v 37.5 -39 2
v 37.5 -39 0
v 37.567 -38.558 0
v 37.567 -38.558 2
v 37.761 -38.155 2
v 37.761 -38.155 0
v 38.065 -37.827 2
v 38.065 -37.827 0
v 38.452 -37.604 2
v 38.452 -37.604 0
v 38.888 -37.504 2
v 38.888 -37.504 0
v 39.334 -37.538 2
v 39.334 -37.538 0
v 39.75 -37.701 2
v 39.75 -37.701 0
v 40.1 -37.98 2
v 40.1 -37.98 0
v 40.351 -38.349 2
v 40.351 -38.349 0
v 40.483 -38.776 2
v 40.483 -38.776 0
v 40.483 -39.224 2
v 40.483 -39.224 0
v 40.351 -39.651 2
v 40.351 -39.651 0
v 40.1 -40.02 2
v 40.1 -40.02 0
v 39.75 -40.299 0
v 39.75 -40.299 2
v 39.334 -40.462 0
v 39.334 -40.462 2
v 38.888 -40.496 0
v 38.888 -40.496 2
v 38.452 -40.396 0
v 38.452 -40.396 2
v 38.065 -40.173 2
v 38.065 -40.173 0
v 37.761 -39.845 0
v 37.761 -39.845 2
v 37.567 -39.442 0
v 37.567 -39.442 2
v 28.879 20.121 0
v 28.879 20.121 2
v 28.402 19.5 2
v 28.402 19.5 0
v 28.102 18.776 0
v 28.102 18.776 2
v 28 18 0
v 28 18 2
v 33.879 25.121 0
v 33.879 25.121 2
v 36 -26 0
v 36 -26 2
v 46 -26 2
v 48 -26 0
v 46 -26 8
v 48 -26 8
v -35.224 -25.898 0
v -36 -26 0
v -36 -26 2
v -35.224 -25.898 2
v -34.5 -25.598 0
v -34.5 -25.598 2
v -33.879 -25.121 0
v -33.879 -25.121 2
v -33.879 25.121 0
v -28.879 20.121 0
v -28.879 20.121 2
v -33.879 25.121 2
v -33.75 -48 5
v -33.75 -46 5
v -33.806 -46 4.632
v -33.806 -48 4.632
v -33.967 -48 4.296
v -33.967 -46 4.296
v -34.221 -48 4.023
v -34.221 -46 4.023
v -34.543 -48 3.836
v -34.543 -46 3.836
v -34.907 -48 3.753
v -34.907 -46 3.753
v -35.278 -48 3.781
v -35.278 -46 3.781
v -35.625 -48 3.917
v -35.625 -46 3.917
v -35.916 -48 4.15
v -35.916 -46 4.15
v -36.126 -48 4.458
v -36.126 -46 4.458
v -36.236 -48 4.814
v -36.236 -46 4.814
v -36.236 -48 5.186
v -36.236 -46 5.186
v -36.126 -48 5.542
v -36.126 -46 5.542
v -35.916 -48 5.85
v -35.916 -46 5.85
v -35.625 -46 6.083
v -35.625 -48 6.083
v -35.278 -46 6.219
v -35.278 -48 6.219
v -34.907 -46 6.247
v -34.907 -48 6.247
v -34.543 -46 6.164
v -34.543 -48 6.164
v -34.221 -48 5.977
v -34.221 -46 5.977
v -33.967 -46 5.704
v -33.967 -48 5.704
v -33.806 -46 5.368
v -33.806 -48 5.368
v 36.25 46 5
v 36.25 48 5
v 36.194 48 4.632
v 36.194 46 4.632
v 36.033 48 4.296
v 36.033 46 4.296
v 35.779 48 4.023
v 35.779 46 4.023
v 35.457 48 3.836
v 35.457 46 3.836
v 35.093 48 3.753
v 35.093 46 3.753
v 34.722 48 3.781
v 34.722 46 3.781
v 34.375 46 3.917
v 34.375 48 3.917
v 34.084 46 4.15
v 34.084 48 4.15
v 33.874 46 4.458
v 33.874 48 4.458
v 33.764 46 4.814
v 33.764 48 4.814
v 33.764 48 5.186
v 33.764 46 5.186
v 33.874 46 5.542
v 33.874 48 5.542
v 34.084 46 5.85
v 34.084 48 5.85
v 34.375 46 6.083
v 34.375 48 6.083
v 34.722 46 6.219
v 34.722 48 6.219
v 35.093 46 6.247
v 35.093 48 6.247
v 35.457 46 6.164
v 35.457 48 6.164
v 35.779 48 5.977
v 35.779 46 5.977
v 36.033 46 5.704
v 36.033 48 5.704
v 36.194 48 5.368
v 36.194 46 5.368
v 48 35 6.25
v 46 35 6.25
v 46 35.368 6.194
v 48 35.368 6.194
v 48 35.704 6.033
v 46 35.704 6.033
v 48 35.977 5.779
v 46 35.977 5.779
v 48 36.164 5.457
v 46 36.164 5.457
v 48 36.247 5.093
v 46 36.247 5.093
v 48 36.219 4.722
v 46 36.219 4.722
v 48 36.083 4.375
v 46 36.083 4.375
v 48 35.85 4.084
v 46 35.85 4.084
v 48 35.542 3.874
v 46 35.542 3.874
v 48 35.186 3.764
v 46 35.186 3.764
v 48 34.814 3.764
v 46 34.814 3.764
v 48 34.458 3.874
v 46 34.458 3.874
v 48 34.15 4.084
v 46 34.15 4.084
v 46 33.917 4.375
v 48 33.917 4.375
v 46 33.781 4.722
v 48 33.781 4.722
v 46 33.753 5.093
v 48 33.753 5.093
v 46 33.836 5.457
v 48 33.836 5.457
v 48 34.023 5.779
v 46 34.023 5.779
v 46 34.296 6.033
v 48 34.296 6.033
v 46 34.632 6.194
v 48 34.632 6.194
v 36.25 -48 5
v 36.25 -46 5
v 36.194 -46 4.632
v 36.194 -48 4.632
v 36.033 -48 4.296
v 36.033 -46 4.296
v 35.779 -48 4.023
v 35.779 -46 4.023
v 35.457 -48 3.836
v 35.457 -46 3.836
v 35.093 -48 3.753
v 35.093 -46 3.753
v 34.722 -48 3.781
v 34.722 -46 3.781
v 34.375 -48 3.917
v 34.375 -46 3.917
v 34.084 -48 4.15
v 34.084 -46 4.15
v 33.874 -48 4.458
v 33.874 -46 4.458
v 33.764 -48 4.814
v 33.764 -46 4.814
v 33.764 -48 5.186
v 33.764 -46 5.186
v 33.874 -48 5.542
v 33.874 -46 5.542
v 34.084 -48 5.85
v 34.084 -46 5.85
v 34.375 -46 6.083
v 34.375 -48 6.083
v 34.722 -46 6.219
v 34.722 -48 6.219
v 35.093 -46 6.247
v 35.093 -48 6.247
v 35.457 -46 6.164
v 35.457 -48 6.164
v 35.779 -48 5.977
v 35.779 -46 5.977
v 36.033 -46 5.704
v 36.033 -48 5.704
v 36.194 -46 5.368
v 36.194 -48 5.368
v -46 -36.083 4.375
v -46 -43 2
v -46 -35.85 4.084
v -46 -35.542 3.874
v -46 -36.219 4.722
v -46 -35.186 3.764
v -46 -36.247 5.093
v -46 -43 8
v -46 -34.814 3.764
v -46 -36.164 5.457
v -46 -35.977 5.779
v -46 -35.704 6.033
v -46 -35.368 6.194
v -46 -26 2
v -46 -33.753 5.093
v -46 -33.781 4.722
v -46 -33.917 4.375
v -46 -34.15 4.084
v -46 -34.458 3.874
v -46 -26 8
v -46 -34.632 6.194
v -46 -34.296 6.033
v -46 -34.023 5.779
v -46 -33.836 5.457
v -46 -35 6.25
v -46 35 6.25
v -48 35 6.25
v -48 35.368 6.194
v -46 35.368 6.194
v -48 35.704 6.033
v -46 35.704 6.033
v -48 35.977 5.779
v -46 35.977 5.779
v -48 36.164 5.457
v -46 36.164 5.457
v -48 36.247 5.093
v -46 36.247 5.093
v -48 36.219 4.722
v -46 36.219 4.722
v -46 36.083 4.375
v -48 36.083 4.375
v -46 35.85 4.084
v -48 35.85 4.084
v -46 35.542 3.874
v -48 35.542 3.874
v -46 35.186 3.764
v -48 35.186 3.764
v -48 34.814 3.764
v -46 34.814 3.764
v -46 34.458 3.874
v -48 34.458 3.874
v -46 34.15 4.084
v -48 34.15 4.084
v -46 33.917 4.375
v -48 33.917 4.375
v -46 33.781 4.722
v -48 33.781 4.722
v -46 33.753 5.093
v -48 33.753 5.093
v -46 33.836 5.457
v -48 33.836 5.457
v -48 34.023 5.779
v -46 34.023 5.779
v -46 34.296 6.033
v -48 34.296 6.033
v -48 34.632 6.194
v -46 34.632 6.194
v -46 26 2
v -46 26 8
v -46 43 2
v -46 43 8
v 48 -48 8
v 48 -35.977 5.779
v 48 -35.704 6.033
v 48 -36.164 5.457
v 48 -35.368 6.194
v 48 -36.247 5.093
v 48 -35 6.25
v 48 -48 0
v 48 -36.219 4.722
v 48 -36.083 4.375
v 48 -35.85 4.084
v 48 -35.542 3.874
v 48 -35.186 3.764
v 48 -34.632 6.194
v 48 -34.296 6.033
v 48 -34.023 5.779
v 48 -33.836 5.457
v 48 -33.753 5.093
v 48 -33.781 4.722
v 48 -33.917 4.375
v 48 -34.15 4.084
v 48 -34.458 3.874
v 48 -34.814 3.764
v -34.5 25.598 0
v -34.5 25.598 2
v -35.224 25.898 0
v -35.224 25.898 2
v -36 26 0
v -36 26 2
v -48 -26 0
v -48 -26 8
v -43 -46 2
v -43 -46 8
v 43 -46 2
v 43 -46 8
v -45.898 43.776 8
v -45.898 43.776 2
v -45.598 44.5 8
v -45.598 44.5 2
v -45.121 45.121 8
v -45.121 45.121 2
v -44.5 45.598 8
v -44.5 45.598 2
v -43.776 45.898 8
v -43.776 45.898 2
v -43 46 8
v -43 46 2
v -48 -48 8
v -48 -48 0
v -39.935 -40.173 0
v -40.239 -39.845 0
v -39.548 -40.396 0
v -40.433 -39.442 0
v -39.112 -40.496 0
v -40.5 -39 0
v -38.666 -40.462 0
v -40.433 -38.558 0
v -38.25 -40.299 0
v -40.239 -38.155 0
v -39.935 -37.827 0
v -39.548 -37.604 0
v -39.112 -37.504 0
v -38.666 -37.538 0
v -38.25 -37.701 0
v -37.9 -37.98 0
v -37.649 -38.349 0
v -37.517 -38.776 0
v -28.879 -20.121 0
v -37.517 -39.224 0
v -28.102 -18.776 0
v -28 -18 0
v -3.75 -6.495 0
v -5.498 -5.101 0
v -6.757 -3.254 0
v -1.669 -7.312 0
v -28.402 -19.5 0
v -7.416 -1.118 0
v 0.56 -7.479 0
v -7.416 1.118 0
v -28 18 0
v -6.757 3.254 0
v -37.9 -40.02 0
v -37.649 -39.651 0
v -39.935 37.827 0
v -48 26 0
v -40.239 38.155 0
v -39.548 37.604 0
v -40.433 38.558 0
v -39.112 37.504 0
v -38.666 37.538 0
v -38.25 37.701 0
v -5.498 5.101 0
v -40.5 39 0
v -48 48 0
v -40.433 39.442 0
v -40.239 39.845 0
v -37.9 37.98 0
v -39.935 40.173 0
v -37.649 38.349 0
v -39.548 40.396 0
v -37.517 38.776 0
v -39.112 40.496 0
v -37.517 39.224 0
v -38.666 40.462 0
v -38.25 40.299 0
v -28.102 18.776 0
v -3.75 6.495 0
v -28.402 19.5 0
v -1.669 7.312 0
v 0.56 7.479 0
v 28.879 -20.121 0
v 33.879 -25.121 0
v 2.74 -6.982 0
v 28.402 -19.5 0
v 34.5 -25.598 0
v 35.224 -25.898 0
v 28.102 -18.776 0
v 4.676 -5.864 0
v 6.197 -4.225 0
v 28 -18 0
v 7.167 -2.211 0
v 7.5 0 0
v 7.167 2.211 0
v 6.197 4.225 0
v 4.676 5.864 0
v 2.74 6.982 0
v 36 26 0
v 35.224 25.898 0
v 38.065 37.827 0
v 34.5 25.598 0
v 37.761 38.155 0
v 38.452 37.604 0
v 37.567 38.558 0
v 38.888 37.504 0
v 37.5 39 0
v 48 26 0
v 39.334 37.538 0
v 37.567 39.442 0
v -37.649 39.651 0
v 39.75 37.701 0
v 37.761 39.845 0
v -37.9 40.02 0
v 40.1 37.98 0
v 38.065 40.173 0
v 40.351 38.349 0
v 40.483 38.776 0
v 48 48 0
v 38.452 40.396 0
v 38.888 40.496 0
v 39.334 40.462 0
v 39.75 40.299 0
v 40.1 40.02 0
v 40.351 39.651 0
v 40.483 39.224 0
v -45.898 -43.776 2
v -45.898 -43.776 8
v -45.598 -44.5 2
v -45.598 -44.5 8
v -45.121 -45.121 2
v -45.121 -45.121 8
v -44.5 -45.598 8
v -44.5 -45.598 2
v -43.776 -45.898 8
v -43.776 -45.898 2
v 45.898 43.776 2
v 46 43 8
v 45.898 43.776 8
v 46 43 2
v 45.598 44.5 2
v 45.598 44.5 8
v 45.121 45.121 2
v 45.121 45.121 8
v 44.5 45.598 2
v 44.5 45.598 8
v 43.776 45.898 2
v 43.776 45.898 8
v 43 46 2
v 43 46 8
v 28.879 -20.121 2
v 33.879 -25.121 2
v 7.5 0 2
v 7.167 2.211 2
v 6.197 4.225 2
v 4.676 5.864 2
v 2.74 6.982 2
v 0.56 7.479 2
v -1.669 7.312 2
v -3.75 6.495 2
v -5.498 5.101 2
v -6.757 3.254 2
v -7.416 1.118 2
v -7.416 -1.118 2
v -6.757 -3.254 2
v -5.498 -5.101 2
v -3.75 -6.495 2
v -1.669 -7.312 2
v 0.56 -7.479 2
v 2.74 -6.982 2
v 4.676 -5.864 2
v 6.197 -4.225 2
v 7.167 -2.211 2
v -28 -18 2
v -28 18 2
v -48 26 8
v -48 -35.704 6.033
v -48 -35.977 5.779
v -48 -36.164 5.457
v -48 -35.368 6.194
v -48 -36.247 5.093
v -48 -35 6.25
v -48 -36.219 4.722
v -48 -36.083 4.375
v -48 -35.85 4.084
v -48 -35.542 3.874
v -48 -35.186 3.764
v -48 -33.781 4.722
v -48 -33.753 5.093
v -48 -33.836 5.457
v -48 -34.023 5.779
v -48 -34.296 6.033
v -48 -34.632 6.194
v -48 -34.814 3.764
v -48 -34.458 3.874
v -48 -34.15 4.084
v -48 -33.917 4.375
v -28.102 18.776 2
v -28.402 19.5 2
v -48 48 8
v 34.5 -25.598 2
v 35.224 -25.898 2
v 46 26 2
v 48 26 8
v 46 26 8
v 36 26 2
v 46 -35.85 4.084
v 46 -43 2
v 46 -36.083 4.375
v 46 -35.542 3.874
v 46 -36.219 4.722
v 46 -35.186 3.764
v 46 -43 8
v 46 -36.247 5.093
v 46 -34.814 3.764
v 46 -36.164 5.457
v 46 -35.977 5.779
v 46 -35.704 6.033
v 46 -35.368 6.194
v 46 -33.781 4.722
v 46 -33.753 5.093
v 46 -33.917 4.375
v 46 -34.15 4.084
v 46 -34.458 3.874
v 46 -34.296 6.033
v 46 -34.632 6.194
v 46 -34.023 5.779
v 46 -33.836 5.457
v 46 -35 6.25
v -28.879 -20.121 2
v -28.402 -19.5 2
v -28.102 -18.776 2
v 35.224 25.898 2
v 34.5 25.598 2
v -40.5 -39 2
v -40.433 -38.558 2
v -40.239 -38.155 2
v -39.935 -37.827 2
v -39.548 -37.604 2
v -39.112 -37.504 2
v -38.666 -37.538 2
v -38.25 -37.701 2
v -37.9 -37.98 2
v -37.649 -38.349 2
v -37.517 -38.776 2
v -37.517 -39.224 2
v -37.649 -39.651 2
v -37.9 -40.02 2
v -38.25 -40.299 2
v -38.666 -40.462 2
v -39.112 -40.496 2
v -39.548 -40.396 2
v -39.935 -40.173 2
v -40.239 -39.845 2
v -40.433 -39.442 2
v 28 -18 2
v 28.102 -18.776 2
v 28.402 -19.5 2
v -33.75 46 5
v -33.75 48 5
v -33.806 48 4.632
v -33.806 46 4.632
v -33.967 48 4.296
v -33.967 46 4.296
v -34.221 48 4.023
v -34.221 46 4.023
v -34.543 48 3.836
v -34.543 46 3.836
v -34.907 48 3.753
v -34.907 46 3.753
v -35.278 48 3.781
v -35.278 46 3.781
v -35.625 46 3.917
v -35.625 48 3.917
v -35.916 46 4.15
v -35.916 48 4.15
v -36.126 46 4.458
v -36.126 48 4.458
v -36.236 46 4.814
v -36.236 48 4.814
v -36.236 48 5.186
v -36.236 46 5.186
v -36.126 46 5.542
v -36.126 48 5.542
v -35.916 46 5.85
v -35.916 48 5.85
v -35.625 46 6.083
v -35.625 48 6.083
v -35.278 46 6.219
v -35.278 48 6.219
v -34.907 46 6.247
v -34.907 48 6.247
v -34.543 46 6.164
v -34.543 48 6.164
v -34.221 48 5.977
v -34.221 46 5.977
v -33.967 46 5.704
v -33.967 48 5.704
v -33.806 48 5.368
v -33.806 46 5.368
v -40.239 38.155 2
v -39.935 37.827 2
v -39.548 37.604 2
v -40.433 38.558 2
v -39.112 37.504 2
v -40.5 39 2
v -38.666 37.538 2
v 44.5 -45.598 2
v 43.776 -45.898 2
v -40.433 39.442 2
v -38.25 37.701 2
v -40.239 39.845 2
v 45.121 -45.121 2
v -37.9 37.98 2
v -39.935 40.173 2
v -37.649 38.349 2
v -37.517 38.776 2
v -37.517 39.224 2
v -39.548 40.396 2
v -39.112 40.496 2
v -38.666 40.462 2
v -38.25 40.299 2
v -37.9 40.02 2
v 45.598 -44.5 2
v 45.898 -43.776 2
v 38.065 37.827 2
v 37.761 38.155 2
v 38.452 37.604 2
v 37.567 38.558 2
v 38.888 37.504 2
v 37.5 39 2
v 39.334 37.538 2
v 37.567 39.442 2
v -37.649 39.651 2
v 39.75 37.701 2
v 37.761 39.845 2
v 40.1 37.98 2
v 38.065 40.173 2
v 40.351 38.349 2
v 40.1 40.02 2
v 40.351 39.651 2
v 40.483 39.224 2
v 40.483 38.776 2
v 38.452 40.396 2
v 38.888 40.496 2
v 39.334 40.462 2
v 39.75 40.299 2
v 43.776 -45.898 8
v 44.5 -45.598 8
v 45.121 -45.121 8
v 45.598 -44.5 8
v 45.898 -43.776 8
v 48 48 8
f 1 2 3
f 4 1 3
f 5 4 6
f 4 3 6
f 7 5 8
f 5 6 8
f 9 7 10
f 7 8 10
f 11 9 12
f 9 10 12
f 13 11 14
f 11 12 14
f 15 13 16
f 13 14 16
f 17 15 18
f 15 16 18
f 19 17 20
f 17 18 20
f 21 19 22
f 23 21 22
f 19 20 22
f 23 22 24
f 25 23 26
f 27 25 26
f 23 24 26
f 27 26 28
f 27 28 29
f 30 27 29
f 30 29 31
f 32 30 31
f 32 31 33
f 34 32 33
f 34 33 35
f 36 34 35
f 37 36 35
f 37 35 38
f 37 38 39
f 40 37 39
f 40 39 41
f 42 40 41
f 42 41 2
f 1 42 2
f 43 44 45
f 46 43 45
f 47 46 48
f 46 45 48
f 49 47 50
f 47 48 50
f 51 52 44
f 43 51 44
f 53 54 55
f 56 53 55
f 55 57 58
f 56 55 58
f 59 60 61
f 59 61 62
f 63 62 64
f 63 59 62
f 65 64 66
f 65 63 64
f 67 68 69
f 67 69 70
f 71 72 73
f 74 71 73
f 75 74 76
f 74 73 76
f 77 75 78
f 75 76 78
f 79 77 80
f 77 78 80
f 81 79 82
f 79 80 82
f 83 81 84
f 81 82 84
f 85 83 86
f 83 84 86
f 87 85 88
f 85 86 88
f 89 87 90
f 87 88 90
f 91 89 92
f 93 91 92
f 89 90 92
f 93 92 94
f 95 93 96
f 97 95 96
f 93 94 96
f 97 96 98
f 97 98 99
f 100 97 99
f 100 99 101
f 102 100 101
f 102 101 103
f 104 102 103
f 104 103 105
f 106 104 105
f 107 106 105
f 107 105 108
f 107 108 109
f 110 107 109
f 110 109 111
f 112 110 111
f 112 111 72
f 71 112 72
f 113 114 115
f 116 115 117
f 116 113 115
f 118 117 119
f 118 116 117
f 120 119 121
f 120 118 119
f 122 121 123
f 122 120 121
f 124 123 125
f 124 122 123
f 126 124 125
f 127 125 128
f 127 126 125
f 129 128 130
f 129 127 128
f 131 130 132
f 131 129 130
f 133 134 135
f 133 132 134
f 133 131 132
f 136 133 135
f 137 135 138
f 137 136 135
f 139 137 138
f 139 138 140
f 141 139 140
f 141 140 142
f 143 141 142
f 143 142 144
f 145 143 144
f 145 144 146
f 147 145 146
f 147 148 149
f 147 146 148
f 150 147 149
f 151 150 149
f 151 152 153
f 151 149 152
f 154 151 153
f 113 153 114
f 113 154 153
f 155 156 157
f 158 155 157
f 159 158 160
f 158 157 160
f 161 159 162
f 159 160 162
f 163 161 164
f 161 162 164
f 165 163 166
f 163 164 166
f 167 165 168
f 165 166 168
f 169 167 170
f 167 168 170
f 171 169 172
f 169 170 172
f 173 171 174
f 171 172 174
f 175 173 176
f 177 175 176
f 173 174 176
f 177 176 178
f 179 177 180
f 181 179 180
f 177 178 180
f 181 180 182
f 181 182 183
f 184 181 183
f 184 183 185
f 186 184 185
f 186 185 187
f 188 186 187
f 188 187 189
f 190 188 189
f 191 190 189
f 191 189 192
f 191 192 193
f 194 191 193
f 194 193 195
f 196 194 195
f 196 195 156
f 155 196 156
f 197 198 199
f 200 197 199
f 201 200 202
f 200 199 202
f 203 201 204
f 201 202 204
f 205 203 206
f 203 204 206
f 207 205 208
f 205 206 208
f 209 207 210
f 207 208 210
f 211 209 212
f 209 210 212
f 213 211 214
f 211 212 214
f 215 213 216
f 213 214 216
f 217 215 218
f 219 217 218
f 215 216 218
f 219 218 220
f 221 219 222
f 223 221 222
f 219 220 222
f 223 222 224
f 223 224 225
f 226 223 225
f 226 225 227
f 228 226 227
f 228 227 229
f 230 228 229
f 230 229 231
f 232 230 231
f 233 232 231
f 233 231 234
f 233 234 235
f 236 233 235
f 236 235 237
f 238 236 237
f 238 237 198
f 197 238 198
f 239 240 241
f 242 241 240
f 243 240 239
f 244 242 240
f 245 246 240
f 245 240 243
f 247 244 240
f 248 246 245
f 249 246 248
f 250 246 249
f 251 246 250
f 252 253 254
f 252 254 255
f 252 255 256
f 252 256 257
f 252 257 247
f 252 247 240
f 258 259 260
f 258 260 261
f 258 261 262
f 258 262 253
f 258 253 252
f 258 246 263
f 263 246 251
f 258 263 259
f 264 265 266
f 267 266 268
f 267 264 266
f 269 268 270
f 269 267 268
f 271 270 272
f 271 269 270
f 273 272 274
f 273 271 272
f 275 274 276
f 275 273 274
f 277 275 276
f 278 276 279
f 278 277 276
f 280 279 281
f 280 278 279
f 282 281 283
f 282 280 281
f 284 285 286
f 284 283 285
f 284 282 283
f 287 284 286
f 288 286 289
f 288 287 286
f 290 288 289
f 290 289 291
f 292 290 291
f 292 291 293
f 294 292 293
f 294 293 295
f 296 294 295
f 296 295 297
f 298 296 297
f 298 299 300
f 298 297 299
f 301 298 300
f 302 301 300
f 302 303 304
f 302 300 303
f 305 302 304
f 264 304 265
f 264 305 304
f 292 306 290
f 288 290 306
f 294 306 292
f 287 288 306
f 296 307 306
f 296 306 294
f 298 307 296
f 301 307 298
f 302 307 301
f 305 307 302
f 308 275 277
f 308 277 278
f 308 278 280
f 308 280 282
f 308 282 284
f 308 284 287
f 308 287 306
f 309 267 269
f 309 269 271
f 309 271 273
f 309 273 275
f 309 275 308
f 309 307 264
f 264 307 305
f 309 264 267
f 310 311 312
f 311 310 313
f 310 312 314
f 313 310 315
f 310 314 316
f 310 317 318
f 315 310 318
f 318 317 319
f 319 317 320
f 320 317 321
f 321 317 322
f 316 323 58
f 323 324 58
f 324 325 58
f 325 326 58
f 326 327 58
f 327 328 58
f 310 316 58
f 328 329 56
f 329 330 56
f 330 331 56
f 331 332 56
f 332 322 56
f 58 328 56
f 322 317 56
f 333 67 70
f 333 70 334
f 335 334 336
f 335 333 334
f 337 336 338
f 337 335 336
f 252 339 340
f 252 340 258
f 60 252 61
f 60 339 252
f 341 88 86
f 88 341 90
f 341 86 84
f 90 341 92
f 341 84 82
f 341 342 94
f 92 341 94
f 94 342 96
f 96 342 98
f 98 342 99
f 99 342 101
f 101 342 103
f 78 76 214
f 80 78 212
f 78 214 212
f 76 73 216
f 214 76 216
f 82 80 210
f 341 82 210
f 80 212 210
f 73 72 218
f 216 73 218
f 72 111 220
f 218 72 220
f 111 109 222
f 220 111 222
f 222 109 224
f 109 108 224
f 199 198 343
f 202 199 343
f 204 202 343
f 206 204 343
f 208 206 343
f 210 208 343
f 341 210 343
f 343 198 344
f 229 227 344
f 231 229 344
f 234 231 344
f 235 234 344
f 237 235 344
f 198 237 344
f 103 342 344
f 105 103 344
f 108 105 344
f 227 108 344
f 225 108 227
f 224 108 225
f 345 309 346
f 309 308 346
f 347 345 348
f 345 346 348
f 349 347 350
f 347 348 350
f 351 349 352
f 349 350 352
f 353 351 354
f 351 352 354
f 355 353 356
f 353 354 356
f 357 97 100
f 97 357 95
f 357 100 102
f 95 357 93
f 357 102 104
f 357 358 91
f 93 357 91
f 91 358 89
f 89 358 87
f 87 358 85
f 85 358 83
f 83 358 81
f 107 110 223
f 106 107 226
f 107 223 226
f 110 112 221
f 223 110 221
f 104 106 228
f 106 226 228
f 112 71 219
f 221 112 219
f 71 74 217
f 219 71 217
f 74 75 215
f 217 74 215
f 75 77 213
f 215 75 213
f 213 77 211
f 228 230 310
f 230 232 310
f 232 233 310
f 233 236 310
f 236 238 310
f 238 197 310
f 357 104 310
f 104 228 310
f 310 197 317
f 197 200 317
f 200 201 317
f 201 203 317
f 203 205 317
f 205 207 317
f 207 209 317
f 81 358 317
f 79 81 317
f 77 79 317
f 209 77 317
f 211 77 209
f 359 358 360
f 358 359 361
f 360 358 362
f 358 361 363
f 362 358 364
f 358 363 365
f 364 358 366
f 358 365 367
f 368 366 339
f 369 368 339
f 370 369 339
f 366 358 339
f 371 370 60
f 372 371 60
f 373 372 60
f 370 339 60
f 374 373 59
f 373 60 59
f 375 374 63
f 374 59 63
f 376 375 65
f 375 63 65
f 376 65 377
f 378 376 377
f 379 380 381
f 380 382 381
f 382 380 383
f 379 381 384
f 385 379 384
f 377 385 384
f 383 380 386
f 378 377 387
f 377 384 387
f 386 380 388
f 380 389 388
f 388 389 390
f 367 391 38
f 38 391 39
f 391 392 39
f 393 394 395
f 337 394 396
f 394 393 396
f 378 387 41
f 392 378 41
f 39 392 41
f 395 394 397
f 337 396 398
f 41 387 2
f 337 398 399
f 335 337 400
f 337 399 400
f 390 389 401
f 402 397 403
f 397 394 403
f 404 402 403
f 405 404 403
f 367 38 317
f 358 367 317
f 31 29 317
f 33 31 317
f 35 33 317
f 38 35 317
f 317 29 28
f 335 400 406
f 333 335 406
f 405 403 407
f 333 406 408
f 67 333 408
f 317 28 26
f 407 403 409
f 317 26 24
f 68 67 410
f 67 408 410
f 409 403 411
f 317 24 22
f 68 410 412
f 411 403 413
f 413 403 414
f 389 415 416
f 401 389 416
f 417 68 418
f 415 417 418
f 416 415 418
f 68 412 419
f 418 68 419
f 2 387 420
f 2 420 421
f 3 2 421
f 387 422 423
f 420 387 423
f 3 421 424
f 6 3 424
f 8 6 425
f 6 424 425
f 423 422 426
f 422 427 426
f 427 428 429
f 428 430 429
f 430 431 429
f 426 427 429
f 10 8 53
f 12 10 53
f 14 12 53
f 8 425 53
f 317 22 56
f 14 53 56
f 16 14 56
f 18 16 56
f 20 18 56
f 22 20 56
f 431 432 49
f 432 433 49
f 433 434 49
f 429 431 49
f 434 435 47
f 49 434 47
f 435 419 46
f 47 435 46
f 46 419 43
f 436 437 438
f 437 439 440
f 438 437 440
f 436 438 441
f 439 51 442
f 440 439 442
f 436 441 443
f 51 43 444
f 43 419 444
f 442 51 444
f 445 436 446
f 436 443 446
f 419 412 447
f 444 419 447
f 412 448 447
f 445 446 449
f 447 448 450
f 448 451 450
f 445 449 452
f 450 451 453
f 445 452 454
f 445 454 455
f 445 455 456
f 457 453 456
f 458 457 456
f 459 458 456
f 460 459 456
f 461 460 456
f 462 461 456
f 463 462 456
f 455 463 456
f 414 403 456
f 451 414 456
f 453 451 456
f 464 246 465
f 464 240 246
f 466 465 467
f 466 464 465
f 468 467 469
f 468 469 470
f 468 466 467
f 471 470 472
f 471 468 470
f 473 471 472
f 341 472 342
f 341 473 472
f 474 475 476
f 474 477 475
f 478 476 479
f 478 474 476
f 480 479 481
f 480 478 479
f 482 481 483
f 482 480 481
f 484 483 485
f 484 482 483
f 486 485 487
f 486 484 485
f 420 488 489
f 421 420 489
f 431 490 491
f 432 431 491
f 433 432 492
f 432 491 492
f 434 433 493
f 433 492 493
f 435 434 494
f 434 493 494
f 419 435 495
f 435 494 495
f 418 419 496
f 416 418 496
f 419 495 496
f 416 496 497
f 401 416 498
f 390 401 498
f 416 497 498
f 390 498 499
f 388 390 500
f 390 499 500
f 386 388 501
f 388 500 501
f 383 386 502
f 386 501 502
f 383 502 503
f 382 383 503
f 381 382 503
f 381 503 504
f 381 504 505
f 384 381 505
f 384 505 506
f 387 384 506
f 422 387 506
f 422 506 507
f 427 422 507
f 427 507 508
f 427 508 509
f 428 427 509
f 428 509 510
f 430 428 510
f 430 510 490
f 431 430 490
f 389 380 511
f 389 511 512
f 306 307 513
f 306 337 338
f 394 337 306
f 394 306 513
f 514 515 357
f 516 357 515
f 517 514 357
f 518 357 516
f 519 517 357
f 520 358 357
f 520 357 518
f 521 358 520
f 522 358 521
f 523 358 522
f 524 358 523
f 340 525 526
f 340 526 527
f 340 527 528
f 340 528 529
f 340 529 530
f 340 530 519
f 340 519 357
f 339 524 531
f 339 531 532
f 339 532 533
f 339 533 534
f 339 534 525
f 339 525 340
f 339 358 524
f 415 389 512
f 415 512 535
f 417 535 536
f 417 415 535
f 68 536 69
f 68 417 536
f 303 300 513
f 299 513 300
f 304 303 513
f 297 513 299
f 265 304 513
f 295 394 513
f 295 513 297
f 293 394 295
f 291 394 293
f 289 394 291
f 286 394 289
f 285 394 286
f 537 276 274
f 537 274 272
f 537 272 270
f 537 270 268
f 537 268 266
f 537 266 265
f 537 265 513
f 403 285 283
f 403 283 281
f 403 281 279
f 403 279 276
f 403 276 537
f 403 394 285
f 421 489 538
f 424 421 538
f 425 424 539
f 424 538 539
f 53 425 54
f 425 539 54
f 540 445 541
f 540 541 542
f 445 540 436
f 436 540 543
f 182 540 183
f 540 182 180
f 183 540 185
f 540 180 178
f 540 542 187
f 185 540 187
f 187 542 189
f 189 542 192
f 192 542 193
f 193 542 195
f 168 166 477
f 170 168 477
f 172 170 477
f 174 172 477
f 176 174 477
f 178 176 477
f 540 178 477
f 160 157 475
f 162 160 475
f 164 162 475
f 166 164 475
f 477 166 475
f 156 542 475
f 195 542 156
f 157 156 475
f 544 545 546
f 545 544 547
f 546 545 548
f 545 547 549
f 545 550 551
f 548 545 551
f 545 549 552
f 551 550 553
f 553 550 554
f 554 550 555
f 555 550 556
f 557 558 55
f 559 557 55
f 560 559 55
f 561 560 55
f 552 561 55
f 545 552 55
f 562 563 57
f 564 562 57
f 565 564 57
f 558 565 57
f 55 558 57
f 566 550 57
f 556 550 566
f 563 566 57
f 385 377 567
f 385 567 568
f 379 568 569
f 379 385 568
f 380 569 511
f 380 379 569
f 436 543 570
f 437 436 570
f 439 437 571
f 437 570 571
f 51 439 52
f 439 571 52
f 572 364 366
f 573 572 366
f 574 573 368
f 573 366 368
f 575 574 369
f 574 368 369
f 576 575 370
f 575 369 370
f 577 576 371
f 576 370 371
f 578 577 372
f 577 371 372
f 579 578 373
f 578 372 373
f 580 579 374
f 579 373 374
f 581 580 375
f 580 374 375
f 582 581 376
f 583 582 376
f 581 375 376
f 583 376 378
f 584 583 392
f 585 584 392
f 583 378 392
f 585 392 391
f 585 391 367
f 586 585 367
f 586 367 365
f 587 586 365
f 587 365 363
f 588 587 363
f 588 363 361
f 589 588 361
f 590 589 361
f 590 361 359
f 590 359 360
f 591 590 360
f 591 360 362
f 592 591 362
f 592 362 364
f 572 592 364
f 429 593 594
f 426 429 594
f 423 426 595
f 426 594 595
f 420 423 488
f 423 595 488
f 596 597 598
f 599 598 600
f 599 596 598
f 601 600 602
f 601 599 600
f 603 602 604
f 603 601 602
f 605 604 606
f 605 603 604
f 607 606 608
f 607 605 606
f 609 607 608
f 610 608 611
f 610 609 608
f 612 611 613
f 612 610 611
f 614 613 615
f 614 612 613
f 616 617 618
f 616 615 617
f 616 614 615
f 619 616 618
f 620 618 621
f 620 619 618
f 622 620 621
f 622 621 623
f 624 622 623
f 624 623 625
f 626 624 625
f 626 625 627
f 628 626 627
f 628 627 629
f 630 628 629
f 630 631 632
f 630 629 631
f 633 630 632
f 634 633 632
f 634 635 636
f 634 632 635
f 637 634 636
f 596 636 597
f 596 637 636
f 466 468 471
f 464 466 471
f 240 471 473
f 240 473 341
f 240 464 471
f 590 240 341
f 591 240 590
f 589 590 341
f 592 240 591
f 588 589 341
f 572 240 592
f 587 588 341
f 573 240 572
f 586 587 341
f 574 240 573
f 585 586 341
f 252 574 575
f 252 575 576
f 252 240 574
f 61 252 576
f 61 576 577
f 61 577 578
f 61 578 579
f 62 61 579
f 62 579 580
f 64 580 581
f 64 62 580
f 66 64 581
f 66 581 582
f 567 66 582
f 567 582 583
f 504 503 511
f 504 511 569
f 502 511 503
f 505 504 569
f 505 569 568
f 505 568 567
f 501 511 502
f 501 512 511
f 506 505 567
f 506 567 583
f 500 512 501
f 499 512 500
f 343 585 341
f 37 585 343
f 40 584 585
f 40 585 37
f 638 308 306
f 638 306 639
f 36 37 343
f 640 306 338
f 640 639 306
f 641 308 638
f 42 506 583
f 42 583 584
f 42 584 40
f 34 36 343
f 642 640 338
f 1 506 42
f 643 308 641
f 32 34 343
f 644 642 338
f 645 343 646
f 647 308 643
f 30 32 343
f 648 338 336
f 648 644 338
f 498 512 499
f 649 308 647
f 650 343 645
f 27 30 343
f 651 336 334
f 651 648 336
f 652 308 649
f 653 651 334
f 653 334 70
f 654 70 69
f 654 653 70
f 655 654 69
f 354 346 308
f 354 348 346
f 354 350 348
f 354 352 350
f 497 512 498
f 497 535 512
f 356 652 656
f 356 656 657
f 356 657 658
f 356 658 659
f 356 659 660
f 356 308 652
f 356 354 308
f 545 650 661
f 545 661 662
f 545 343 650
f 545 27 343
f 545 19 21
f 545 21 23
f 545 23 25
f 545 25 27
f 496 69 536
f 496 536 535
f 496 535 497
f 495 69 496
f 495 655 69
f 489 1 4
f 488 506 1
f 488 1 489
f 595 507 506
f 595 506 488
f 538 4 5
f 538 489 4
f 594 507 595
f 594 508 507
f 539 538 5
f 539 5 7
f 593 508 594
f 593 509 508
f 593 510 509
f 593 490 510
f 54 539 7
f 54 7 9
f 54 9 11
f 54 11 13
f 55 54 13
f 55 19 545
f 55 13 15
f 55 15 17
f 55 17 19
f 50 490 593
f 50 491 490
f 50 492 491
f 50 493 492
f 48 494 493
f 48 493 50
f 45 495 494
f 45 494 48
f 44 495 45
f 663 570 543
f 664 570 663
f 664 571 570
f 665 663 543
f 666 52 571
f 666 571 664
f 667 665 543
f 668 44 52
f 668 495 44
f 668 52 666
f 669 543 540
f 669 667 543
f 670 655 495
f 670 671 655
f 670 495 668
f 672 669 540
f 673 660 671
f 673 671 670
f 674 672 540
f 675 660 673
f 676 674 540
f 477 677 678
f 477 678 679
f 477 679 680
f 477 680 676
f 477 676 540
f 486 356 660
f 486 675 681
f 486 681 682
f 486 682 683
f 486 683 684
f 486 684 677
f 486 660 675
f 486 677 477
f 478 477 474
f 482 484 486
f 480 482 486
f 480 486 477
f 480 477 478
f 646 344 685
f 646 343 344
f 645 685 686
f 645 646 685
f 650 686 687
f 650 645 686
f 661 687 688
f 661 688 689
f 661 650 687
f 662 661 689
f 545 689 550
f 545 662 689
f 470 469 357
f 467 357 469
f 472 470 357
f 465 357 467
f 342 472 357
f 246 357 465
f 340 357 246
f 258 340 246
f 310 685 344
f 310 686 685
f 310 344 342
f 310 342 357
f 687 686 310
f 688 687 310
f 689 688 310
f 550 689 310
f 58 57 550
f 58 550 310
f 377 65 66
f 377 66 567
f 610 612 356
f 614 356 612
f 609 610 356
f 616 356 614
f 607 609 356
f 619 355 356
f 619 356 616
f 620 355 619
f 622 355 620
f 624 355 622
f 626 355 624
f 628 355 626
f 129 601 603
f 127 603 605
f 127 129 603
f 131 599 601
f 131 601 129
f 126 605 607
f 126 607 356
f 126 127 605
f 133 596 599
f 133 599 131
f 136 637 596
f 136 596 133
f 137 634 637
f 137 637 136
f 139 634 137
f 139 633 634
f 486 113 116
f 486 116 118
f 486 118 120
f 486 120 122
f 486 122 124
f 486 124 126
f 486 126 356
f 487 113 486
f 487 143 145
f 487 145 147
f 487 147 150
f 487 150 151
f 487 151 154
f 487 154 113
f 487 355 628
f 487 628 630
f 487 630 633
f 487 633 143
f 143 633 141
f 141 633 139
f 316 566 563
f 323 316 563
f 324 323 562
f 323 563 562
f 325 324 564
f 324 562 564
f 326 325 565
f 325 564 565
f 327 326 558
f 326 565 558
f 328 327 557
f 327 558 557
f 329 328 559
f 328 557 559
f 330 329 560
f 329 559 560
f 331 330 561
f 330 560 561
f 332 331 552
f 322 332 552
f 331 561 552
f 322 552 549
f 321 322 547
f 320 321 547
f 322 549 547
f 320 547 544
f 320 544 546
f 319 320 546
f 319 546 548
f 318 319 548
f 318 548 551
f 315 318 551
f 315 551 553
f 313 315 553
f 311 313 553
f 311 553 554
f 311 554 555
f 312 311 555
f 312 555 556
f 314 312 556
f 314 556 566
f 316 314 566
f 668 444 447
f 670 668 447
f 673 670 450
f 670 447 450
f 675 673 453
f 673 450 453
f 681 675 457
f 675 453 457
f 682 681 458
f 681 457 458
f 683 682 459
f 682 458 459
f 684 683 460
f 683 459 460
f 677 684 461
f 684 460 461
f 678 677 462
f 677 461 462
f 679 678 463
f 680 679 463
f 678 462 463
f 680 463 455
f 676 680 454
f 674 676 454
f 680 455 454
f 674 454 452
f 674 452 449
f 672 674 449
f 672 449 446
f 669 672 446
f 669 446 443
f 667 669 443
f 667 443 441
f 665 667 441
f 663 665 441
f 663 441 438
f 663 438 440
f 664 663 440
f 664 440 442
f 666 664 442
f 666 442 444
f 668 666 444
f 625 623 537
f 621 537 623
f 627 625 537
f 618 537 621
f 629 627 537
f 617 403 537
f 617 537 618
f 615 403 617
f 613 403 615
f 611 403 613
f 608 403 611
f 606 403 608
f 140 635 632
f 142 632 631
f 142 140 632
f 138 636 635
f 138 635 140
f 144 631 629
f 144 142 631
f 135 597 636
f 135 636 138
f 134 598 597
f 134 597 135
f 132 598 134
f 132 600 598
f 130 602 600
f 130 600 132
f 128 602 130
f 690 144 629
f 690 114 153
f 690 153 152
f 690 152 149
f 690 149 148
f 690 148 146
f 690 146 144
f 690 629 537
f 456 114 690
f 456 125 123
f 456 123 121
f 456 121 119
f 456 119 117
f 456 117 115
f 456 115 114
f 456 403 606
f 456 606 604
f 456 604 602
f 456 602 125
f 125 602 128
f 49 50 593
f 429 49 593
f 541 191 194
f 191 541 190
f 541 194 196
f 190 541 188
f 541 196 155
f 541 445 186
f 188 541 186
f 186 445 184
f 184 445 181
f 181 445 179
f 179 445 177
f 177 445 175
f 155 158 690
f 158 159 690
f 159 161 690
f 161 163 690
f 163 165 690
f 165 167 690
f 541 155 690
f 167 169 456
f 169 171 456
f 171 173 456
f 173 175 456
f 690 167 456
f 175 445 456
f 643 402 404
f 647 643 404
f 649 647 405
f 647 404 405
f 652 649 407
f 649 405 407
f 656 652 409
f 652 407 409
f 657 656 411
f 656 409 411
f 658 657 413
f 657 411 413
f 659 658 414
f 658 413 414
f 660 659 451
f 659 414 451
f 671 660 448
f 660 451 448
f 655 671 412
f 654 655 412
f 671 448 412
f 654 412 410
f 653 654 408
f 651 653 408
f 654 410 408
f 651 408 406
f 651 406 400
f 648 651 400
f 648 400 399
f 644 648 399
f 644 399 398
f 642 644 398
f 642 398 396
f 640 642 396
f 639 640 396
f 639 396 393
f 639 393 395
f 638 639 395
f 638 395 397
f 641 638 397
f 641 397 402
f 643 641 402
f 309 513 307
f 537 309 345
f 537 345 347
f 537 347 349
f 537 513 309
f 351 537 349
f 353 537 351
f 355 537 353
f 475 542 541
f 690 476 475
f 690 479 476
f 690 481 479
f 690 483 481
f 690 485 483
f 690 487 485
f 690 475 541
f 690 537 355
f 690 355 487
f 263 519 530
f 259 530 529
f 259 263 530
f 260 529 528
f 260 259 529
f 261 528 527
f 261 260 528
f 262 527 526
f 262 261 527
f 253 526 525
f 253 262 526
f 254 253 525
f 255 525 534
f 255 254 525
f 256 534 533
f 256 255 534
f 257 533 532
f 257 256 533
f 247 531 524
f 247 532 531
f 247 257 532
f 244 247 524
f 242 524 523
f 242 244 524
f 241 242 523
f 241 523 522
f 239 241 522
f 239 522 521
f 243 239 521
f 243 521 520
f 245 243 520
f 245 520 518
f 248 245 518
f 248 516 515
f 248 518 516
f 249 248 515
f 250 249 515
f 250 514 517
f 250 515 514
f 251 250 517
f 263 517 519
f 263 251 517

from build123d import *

# Parameters (mm, degrees)
SKETCH1_W                       = 96
SKETCH1_H                       = 96
BOSS_EXTRUDE1_DEPTH             = 8
SKETCH2_W                       = 92
SKETCH2_H                       = 92
COMPONENT_PLATFORM_DEPTH        = 6
CABLE_SLOTS_DEPTH               = 6
SKETCH4_R                       = 7.5
CENTER_MASS_CUT_DEPTH           = 6
INNER_CORNER_FILLETS_R          = 3
TAP_DRILL_FOR_M3X0_5_TAP1_D     = 2.5
TAP_DRILL_FOR_M3X0_5_TAP1_DEPTH = 2
TAP_DRILL_FOR_M3X0_5_TAP2_D     = 2.5
TAP_DRILL_FOR_M3X0_5_TAP2_DEPTH = 2
F_3_0MM_DOWEL_HOLE3_D           = 3
F_3_0MM_DOWEL_HOLE3_DEPTH       = 10
F_3_0MM_DOWEL_HOLE3_TIP         = 0.901290929


with BuildPart() as part:
    # Sketch1 → Boss-Extrude1 (new body)
    with BuildSketch(Plane.XY):
        Rectangle(SKETCH1_W, SKETCH1_H)
    extrude(amount=BOSS_EXTRUDE1_DEPTH)

    # Sketch2 → Component Platform (cut)
    with BuildSketch(Plane.XY.offset(8)):
        Rectangle(SKETCH2_W, SKETCH2_H)
    extrude(amount=-COMPONENT_PLATFORM_DEPTH, mode=Mode.SUBTRACT)

    # Sketch3 → Cable Slots (cut, symmetric)
    with BuildSketch(Plane.XY.offset(2)):
        with BuildLine():
            Line((-33.878679656, -25.121320344), (-28.878679656, -20.121320344))
            ThreePointArc((-28.878679656, -20.121320344), (-28.228361402, -19.148050297), (-28, -18))
            Line((-28, -18), (-28, 18))
            ThreePointArc((-28, 18), (-28.228361402, 19.148050297), (-28.878679656, 20.121320344))
            Line((-28.878679656, 20.121320344), (-33.878679656, 25.121320344))
            ThreePointArc((-33.878679656, 25.121320344), (-34.851949703, 25.771638598), (-36, 26))
            Line((-36, 26), (-48, 26))
            Line((-48, 26), (-48, -26))
            Line((-48, -26), (-36, -26))
            ThreePointArc((-36, -26), (-34.851949703, -25.771638598), (-33.878679656, -25.121320344))
        make_face()
        with BuildLine():
            Line((48, -26), (48, 26))
            Line((48, 26), (36, 26))
            ThreePointArc((36, 26), (34.851949703, 25.771638598), (33.878679656, 25.121320344))
            Line((33.878679656, 25.121320344), (28.878679656, 20.121320344))
            ThreePointArc((28.878679656, 20.121320344), (28.228361402, 19.148050297), (28, 18))
            Line((28, 18), (28, -18))
            ThreePointArc((28, -18), (28.228361402, -19.148050297), (28.878679656, -20.121320344))
            Line((28.878679656, -20.121320344), (33.878679656, -25.121320344))
            ThreePointArc((33.878679656, -25.121320344), (34.851949703, -25.771638598), (36, -26))
            Line((36, -26), (48, -26))
        make_face()
    extrude(amount=CABLE_SLOTS_DEPTH, both=True, mode=Mode.SUBTRACT)

    # Sketch4 → Center Mass Cut (cut)
    with BuildSketch(Plane.XY.offset(2)):
        Circle(SKETCH4_R)
    extrude(amount=-CENTER_MASS_CUT_DEPTH, mode=Mode.SUBTRACT)

    # Inner Corner Fillets
    inner_corner_fillets_edges = [part.edges().sort_by_distance(p)[0] for p in [
        (-46, -46, 5),
        (-46, 46, 5),
        (46, 46, 5),
        (46, -46, 5),
    ]]
    fillet(inner_corner_fillets_edges, radius=INNER_CORNER_FILLETS_R)

    # Tap Drill for M3x0.5 Tap1
    with Locations(Plane(origin=(0, -48, 0), x_dir=(-1, 0, 0), z_dir=(0, -1, 0))):
        with Locations((35, -5), (-35, -5)):
            tap_drill_for_m3x0_5_tap1 = Hole(TAP_DRILL_FOR_M3X0_5_TAP1_D / 2, depth=TAP_DRILL_FOR_M3X0_5_TAP1_DEPTH)

    # Tap Drill for M3x0.5 Tap2
    with Locations(Plane(origin=(48, 0, 0), x_dir=(0, 0, -1), z_dir=(1, 0, 0))):
        with Locations((-5, -35), (-5, 35)):
            tap_drill_for_m3x0_5_tap2 = Hole(TAP_DRILL_FOR_M3X0_5_TAP2_D / 2, depth=TAP_DRILL_FOR_M3X0_5_TAP2_DEPTH)

    # Mirror1: Tap Drill for M3x0.5 Tap1 across plane
    add(tap_drill_for_m3x0_5_tap1.mirror(Plane(origin=(0, 0, 0), x_dir=(0, 0, 1), z_dir=(0, -1, 0))), mode=Mode.SUBTRACT)

    # Mirror2: Tap Drill for M3x0.5 Tap2 across plane
    add(tap_drill_for_m3x0_5_tap2.mirror(Plane(origin=(0, 0, 0), x_dir=(0, 0, 1), z_dir=(1, 0, 0))), mode=Mode.SUBTRACT)

    # Ø3.0mm Dowel Hole3
    with Locations(Plane.XY.offset(2)):
        with Locations((-39, -39), (39, -39), (39, 39), (-39, 39)):
            Hole(F_3_0MM_DOWEL_HOLE3_D / 2, depth=F_3_0MM_DOWEL_HOLE3_DEPTH)
            with Locations((0, 0, -(F_3_0MM_DOWEL_HOLE3_DEPTH + F_3_0MM_DOWEL_HOLE3_TIP / 2))):  # 118° drill point
                Cone(0, F_3_0MM_DOWEL_HOLE3_D / 2, F_3_0MM_DOWEL_HOLE3_TIP, mode=Mode.SUBTRACT)


solid = part.part
